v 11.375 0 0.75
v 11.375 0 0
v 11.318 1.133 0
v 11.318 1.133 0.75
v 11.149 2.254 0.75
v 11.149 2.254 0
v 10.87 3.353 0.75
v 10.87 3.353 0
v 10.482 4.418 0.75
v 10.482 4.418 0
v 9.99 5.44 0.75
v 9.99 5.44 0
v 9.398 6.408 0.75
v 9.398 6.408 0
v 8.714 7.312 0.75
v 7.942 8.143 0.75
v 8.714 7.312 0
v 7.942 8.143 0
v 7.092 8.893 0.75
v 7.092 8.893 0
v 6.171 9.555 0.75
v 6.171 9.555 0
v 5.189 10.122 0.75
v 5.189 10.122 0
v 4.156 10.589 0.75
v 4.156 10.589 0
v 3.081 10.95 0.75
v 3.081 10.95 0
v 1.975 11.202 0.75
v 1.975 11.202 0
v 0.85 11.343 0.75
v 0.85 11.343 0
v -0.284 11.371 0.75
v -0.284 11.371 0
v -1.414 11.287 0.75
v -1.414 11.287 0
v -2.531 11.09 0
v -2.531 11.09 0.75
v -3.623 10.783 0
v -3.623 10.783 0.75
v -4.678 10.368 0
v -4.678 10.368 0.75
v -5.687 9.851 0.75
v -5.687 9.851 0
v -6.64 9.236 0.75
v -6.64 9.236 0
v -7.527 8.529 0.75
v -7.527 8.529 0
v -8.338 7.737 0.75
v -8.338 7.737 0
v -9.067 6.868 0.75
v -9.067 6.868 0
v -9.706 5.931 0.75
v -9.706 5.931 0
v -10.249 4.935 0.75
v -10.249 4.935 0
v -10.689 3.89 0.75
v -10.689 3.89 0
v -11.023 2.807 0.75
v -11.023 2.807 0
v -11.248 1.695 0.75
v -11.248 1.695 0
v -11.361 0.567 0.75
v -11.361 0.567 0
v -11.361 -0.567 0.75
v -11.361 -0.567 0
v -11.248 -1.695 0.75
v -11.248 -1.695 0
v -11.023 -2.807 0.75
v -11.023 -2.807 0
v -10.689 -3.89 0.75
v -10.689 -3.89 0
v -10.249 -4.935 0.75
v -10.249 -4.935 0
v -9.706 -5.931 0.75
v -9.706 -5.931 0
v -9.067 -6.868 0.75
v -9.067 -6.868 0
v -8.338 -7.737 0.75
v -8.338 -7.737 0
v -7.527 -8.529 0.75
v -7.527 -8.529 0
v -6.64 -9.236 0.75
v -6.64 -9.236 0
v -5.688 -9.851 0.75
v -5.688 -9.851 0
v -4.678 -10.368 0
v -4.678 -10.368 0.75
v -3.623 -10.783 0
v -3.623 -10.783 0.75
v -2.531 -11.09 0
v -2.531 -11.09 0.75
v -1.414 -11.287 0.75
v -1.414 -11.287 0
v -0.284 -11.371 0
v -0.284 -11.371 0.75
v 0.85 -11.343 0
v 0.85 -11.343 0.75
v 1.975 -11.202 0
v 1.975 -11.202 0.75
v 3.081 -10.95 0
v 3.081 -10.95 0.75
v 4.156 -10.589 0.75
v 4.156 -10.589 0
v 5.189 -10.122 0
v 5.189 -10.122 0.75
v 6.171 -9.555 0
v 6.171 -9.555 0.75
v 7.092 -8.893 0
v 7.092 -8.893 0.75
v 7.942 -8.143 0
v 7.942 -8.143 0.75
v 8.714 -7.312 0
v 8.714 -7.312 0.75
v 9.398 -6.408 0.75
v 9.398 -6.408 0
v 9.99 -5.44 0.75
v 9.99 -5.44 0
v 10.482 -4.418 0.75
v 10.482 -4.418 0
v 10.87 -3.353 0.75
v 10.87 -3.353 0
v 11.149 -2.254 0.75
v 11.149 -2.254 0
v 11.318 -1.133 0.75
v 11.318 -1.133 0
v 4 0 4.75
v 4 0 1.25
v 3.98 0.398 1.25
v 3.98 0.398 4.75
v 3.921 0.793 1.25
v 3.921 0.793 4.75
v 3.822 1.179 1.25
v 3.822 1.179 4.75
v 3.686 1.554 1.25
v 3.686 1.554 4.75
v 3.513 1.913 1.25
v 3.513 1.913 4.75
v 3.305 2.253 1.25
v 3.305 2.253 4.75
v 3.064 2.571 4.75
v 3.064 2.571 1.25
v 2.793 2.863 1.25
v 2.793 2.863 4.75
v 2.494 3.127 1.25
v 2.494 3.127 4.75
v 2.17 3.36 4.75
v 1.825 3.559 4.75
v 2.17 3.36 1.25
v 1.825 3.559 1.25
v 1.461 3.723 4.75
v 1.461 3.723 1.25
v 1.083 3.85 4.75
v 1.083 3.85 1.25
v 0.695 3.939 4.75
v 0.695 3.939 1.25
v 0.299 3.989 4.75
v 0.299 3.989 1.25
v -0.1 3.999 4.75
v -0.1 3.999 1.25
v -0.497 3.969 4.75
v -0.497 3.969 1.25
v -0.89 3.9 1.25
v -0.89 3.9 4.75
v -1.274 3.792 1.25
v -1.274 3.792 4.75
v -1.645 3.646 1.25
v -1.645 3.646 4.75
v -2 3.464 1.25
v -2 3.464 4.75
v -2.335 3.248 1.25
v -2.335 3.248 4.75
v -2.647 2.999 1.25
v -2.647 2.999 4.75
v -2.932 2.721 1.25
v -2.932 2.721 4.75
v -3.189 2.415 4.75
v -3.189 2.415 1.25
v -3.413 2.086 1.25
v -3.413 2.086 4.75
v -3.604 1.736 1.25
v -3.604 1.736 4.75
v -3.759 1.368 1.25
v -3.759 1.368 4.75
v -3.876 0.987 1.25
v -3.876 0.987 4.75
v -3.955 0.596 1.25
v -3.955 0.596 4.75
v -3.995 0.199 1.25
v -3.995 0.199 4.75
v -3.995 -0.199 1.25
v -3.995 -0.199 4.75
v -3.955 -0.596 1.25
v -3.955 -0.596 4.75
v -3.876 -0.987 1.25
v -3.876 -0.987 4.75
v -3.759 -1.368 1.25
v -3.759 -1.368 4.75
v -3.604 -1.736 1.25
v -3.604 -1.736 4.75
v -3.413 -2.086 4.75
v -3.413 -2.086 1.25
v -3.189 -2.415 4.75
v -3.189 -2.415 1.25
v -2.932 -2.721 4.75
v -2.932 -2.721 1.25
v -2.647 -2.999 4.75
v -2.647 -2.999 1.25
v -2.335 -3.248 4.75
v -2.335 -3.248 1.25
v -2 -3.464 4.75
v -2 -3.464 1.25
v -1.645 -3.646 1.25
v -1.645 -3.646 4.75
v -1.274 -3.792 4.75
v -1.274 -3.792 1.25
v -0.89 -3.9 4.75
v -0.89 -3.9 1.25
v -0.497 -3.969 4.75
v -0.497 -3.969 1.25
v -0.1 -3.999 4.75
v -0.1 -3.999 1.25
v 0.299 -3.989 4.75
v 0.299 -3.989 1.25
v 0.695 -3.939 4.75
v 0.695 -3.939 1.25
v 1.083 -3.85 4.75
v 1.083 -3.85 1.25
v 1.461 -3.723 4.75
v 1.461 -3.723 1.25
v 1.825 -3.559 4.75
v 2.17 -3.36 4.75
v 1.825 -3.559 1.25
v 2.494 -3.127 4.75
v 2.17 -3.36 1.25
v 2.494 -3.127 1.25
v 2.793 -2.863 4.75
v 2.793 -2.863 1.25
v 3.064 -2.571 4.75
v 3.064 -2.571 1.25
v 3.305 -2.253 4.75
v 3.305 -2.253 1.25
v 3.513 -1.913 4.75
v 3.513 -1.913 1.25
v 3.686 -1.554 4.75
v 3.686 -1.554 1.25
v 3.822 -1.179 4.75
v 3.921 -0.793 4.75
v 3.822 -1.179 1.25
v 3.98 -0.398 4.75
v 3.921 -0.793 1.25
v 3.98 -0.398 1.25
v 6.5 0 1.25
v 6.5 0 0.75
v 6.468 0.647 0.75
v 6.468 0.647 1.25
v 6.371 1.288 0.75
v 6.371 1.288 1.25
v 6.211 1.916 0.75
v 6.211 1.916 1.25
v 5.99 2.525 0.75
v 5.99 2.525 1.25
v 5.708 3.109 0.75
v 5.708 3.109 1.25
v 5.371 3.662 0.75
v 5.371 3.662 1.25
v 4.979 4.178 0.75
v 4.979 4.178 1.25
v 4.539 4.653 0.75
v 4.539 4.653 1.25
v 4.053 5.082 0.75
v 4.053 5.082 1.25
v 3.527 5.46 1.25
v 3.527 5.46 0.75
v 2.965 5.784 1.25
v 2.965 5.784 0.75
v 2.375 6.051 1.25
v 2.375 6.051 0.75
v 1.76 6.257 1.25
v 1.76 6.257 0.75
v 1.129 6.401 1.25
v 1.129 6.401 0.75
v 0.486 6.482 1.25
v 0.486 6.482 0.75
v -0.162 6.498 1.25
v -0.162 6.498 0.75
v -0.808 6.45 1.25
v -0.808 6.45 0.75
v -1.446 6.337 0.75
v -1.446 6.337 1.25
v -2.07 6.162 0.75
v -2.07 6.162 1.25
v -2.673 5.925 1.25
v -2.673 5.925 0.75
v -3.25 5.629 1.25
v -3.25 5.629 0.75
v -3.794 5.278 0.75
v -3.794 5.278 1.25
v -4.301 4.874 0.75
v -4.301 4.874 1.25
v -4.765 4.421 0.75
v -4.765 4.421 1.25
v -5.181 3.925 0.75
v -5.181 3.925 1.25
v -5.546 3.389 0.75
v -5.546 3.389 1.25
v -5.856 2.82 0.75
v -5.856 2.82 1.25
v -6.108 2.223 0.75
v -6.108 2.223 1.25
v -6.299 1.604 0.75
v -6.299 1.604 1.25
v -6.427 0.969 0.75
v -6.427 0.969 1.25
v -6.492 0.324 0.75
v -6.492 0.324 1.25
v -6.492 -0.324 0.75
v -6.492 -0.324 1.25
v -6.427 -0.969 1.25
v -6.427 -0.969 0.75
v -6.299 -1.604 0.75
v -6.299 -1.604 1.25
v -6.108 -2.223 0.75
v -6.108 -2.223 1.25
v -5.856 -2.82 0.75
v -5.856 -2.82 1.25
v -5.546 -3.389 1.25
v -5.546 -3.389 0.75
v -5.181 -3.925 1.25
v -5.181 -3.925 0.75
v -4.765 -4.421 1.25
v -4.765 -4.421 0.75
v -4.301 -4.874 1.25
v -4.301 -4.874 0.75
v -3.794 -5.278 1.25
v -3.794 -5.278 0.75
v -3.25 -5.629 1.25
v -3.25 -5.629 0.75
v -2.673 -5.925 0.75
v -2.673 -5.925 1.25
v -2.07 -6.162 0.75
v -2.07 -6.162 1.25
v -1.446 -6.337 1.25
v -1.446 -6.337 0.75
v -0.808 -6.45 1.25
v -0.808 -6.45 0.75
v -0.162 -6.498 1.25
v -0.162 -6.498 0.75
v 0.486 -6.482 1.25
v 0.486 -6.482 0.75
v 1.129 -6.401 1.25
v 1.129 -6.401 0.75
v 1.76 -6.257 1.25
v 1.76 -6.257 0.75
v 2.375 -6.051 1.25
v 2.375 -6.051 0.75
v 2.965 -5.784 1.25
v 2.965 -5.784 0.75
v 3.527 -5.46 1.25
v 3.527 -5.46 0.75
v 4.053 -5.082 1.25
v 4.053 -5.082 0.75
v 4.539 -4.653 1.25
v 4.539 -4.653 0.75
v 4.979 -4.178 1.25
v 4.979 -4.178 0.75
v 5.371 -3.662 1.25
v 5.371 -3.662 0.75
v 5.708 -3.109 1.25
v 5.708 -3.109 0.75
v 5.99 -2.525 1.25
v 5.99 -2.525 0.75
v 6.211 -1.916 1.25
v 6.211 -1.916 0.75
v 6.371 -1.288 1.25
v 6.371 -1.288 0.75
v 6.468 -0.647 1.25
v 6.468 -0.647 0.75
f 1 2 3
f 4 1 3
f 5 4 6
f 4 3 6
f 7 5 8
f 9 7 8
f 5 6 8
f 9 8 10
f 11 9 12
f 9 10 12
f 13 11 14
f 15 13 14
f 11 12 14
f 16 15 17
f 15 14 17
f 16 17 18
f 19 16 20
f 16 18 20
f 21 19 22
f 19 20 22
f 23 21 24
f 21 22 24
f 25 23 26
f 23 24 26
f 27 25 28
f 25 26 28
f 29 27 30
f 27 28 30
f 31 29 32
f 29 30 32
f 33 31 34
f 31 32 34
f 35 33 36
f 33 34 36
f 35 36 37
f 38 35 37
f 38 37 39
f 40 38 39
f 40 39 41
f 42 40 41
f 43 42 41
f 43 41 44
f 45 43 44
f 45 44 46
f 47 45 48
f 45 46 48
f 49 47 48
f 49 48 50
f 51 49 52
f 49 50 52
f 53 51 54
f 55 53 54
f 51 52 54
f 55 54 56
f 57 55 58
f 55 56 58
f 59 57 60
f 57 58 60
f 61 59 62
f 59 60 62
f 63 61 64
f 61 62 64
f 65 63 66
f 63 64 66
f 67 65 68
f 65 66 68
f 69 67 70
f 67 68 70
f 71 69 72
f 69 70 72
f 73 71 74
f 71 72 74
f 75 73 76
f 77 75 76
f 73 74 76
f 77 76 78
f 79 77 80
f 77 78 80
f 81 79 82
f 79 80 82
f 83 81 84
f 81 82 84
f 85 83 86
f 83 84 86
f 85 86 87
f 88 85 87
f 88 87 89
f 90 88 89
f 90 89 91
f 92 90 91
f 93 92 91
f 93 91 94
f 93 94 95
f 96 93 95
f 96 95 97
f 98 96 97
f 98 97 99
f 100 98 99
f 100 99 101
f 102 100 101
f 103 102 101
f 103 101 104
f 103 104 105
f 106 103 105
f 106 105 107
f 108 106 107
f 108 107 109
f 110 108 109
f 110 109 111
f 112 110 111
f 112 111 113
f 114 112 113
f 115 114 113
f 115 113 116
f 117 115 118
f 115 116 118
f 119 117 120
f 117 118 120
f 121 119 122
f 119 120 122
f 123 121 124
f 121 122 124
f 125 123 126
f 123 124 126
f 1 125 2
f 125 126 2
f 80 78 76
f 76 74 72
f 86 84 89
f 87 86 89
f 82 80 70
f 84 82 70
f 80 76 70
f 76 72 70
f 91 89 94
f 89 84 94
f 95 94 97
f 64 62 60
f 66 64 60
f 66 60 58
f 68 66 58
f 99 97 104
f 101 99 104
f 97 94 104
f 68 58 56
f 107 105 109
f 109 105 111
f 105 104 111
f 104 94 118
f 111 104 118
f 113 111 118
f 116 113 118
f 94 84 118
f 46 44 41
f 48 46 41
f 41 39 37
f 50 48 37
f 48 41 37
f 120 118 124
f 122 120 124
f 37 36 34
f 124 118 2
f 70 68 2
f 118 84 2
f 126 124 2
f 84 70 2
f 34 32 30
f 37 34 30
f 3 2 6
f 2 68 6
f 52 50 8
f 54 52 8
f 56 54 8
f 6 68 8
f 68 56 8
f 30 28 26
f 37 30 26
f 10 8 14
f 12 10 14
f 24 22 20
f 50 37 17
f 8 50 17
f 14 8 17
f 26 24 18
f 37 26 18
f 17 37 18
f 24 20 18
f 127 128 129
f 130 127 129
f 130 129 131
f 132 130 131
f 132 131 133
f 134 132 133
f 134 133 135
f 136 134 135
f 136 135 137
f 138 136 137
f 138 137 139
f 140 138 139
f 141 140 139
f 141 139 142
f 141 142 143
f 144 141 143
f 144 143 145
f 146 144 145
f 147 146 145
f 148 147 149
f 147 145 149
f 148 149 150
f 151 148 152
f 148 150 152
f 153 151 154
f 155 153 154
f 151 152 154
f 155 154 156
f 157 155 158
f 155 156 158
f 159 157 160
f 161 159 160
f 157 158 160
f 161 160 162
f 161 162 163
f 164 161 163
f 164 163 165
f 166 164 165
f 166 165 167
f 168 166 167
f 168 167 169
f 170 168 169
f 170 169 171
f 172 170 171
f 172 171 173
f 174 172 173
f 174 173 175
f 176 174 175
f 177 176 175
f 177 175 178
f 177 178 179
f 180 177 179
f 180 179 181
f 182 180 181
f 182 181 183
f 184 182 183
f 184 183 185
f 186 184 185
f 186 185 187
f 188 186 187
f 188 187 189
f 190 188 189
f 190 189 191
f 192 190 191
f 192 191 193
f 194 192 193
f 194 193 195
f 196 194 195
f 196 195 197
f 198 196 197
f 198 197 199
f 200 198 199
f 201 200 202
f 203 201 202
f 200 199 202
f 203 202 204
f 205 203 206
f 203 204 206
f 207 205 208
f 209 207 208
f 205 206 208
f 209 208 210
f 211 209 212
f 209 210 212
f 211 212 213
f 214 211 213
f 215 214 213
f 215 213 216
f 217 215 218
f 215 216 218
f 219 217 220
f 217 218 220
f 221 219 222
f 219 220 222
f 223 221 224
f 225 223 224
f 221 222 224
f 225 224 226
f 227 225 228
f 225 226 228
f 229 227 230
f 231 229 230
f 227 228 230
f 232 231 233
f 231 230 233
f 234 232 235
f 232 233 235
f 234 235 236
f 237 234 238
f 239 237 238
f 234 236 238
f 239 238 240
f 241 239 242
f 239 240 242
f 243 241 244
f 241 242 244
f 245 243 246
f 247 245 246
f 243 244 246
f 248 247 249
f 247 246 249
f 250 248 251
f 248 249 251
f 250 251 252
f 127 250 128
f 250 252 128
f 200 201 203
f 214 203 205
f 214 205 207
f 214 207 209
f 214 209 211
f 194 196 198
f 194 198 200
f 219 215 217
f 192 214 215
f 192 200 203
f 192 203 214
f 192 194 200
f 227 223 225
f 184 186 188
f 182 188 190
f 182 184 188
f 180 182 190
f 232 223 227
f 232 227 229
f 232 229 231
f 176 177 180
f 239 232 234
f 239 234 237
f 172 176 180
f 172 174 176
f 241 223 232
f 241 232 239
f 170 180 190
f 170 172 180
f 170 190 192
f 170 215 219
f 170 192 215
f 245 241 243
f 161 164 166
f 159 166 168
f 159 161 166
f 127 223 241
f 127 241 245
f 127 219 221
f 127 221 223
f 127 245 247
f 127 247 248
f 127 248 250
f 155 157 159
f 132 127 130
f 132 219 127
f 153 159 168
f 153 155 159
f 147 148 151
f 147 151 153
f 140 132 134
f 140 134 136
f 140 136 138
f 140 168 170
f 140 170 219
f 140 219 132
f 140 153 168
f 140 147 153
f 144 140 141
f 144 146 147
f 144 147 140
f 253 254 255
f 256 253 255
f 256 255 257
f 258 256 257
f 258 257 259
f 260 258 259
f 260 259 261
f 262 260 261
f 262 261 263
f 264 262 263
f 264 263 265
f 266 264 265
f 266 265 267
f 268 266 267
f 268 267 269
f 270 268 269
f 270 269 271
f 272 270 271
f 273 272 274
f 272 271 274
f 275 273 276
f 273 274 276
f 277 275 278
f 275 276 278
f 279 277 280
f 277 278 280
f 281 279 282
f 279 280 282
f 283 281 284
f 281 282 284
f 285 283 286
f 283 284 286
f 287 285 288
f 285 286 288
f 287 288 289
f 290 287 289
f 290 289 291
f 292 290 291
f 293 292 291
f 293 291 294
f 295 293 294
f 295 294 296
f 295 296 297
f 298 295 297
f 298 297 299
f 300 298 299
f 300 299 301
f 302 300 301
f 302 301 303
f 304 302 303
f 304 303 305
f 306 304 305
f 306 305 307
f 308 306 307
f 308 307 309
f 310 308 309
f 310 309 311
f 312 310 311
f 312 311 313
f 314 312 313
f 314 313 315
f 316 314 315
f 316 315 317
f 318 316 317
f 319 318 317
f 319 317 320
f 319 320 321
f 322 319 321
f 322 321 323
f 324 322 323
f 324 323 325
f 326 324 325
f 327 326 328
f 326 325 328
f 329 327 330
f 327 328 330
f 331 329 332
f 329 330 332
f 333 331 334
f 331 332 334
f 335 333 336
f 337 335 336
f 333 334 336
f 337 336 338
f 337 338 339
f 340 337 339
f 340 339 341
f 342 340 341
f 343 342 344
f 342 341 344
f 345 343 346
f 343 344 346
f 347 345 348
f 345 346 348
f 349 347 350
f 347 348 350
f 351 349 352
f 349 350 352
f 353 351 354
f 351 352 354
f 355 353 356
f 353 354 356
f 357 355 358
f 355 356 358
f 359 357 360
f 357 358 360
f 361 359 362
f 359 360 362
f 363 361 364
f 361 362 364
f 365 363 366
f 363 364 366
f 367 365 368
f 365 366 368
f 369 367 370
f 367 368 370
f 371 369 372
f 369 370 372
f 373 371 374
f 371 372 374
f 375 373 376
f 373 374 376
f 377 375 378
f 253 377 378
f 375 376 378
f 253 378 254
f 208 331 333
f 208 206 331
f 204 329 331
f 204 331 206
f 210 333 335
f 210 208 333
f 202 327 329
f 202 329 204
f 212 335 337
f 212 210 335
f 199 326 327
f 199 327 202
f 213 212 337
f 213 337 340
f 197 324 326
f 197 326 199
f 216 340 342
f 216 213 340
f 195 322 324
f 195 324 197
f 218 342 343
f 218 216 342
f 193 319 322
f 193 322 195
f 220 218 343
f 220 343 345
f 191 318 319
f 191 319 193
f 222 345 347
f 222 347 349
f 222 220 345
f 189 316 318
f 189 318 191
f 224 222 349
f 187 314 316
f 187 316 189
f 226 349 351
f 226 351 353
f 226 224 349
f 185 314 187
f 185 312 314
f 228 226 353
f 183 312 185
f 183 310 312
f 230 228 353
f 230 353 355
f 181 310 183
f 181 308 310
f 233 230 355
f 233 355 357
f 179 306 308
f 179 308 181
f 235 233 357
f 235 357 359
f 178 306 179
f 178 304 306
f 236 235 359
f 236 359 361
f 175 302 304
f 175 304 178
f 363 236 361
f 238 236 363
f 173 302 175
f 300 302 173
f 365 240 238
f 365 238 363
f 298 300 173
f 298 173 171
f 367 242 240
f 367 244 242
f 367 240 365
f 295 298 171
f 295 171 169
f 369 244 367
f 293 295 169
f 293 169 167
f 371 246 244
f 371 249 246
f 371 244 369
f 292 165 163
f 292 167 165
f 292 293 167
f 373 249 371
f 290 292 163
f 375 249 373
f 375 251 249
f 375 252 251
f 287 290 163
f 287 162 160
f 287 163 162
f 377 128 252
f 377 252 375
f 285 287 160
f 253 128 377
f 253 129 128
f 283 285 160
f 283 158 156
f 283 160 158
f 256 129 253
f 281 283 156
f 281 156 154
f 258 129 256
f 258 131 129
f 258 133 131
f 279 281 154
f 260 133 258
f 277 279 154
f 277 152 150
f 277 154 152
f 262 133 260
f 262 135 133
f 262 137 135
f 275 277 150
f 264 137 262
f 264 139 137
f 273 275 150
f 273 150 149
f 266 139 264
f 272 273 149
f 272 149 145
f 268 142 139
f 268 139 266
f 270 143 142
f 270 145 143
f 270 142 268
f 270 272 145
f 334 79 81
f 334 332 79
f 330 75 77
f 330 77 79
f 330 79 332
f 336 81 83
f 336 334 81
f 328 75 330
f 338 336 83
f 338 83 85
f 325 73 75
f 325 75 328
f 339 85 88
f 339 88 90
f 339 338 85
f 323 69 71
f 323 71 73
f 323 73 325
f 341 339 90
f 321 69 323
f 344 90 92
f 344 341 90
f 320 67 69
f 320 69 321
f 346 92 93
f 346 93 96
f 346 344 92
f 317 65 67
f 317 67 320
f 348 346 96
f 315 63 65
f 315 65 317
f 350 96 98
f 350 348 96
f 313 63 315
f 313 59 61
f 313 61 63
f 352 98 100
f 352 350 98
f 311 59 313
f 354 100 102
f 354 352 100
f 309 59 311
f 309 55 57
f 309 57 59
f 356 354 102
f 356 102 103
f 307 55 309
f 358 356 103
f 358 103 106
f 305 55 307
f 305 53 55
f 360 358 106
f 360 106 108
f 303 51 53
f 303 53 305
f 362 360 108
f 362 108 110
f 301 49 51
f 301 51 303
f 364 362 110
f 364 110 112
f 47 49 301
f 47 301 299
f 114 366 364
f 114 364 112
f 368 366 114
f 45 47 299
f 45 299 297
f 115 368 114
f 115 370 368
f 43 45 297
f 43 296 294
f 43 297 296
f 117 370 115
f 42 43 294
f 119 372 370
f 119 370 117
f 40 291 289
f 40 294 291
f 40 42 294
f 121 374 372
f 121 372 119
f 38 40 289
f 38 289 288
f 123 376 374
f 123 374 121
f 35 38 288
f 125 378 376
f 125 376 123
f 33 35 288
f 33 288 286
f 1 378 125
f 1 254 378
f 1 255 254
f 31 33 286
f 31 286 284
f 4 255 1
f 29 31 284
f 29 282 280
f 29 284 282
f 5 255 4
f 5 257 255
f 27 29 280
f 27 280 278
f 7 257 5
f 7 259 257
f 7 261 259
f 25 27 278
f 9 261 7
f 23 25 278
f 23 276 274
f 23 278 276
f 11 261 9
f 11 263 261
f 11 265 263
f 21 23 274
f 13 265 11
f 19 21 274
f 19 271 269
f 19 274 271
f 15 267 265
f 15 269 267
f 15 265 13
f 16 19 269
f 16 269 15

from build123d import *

# Parameters (mm, degrees)
F0_R     = 11.375
F0_R_2   = 6.5
F1_DEPTH = 0.75
F0_R_3   = 4
F2_DEPTH = 1.25
F3_DEPTH = 4.75


with BuildPart() as f1:
    # F0 (on Top) → F1 (new body)
    with BuildSketch(Plane.XY):
        Circle(F0_R)
        Circle(F0_R_2, mode=Mode.SUBTRACT)
    extrude(amount=F1_DEPTH)

    # F0 (on Top) → F2 (join)
    with BuildSketch(Plane.XY):
        Circle(F0_R_2)
        Circle(F0_R_3, mode=Mode.SUBTRACT)
    extrude(amount=F2_DEPTH)

    # F0 (on Top) → F3 (join)
    with BuildSketch(Plane.XY):
        Circle(F0_R_3)
    extrude(amount=F3_DEPTH)


solid = f1.part
